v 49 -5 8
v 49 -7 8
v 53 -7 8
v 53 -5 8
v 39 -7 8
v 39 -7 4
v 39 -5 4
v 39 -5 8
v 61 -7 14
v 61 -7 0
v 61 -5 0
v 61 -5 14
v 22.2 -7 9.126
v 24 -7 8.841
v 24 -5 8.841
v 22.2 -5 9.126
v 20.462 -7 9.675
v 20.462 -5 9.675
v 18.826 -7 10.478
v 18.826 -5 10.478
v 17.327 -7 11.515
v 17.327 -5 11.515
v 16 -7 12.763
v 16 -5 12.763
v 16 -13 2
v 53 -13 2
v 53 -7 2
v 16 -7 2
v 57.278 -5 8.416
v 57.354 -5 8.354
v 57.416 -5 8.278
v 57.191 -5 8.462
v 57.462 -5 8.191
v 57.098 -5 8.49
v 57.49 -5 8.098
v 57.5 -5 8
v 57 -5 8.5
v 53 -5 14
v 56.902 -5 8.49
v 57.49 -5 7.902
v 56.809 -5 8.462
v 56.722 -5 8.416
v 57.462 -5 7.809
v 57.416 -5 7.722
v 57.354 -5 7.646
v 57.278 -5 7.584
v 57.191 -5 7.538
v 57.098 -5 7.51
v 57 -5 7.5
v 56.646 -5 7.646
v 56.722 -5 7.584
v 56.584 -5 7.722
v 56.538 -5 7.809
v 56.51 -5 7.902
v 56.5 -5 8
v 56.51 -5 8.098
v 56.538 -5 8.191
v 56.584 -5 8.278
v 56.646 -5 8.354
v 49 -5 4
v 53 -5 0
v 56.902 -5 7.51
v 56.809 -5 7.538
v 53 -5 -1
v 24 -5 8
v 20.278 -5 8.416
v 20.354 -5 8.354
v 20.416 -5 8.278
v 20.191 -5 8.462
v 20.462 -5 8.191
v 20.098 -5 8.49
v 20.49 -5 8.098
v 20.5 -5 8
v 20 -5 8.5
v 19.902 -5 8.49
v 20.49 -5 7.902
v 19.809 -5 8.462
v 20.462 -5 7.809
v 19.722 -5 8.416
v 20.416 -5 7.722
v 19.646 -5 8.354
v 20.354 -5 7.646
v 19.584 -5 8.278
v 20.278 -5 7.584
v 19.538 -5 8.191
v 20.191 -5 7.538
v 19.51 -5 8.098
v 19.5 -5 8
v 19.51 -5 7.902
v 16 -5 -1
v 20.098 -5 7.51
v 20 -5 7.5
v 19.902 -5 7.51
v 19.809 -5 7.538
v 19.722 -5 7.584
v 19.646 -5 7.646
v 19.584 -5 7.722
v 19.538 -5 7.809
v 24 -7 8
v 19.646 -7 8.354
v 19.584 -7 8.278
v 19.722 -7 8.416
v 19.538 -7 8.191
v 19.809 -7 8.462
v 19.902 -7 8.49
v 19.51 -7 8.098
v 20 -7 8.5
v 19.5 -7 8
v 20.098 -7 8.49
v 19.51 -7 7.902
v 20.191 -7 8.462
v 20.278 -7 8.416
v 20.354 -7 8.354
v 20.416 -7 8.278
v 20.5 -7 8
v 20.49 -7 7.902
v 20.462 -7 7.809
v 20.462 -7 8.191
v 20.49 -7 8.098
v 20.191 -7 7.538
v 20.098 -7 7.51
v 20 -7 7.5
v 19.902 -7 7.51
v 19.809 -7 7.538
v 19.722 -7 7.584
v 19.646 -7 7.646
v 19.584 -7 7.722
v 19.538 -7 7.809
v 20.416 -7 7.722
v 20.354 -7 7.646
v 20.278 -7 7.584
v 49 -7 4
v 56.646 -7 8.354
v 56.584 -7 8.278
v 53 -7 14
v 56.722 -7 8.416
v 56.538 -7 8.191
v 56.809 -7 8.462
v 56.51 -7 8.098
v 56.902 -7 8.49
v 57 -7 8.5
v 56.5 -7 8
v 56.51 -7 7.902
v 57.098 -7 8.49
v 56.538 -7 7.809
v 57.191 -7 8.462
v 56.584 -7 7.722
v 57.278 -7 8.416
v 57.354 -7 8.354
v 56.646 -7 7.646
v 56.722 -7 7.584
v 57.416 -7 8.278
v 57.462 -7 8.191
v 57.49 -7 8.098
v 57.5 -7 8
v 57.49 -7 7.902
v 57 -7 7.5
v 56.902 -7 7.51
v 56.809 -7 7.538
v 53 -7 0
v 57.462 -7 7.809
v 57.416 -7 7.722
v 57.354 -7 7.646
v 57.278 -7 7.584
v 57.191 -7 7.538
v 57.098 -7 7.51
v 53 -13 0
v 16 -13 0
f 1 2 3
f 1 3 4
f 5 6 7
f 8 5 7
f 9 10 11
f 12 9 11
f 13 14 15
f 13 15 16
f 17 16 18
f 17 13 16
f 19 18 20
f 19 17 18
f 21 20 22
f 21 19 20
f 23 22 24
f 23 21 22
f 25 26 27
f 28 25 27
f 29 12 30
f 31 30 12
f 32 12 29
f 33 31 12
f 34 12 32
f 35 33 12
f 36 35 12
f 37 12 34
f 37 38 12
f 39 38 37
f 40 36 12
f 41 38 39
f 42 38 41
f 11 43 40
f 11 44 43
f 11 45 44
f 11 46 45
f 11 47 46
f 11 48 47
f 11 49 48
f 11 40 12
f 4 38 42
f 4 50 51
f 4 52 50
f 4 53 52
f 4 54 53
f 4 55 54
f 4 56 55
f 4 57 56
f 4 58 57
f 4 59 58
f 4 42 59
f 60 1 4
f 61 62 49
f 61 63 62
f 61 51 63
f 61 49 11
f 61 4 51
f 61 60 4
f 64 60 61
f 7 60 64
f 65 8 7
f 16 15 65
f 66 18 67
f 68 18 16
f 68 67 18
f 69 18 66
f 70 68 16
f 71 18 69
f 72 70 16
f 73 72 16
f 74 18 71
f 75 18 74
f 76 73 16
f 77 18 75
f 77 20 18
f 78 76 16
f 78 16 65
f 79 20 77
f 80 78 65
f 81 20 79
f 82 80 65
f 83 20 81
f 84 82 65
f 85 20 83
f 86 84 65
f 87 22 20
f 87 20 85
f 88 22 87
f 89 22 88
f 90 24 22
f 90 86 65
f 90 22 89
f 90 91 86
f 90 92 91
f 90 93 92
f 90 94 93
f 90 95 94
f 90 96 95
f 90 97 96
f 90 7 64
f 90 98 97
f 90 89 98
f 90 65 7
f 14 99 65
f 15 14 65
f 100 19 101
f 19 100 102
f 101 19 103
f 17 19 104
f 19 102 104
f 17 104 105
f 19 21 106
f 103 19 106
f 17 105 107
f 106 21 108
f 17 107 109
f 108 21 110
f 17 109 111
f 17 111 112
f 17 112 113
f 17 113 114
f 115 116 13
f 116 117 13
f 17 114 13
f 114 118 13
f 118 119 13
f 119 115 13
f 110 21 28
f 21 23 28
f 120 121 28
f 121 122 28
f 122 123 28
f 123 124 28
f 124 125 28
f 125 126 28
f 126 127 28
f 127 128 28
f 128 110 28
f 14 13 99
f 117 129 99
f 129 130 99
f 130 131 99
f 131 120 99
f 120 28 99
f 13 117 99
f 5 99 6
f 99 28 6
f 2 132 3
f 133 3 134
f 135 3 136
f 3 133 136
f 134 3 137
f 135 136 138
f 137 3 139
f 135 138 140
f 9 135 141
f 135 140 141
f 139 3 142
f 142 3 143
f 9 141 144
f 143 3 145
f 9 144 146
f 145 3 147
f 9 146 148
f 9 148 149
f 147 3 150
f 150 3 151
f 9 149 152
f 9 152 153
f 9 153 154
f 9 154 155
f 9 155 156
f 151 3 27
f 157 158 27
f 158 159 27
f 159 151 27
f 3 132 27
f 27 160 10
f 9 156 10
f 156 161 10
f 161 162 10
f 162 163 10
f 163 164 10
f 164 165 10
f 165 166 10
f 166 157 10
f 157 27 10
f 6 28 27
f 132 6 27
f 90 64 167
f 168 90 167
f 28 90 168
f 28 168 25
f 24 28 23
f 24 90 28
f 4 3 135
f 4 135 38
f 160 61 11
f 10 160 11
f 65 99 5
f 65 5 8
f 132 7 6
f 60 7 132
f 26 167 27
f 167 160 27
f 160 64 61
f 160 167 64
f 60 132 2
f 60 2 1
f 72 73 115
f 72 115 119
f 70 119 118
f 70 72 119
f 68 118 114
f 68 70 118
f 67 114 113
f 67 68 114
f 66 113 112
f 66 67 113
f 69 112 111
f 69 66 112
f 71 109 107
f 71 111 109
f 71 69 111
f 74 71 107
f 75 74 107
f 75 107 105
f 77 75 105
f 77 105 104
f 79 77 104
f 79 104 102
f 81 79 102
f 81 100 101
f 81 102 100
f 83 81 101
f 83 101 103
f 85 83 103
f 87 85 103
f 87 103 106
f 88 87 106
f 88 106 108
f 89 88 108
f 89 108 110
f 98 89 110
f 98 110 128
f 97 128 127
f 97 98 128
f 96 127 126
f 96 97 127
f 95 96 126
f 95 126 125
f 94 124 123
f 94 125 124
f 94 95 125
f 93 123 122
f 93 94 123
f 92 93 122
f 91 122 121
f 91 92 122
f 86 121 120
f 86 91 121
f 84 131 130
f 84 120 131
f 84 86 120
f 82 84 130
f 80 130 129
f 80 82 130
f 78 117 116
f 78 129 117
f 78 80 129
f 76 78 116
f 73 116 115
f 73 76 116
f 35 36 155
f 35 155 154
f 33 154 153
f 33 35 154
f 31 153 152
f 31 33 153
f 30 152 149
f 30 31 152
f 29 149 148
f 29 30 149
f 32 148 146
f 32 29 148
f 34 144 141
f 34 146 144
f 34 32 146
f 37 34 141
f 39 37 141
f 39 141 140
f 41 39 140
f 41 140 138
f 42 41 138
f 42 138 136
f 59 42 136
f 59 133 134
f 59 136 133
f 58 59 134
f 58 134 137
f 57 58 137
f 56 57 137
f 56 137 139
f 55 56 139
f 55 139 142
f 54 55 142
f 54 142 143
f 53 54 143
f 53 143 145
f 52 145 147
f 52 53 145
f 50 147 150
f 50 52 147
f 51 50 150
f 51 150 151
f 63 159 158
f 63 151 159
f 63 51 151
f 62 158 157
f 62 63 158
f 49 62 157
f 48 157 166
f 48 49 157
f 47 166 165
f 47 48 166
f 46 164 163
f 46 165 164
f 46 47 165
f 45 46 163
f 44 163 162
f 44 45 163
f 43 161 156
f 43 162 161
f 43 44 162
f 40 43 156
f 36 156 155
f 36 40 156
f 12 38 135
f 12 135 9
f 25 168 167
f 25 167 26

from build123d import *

# Parameters (mm, degrees)
CYLINDER050_R     = 12.2
CYLINDER050_DEPTH = 2
CYLINDER003_R     = 0.5
CYLINDER003_DEPTH = 10
CYLINDER004_R     = 0.5
CYLINDER004_DEPTH = 10
BOX003_W          = 8
BOX003_H          = 2
BOX003_DEPTH      = 14
BOX004_W          = 10
BOX004_H          = 2
BOX004_DEPTH      = 4
PAD017_DEPTH      = 37
BOX002_W          = 8
BOX002_H          = 2
BOX002_DEPTH      = 14


with BuildPart() as cylinder050:
    # Cylinder050 → Cylinder050 (new body)
    with BuildSketch(Plane(origin=(25, -7, 21), x_dir=(1, 0, 0), z_dir=(0, 1, 0))):
        Circle(CYLINDER050_R)
    extrude(amount=CYLINDER050_DEPTH)


with BuildPart() as cylinder003:
    # Cylinder003 → Cylinder003 (new body)
    with BuildSketch(Plane(origin=(57, 0, 8), x_dir=(1, 0, 0), z_dir=(0, -1, 0))):
        Circle(CYLINDER003_R)
    extrude(amount=CYLINDER003_DEPTH)


with BuildPart() as fusion007:
    # Cylinder004 → Cylinder004 (new body)
    with BuildSketch(Plane(origin=(20, 0, 8), x_dir=(1, 0, 0), z_dir=(0, -1, 0))):
        Circle(CYLINDER004_R)
    extrude(amount=CYLINDER004_DEPTH)

    # Fusion007: union Cylinder003
    add(cylinder003.part)


with BuildPart() as cube003:
    # Box003 → Box003 (new body)
    with BuildSketch(Plane(origin=(16, -7, 0), x_dir=(1, 0, 0), z_dir=(0, 0, 1))):
        with Locations((4, 1)):
            Rectangle(BOX003_W, BOX003_H)
    extrude(amount=BOX003_DEPTH)


with BuildPart() as cube004:
    # Box004 → Box004 (new body)
    with BuildSketch(Plane(origin=(39, -7, 4), x_dir=(1, 0, 0), z_dir=(0, 0, 1))):
        with Locations((5, 1)):
            Rectangle(BOX004_W, BOX004_H)
    extrude(amount=BOX004_DEPTH)


with BuildPart() as cut002:
    # Sketch152 → Pad017 (new body)
    with BuildSketch(Plane.ZY):
        Polygon((-1, -5), (0, -13), (1.999611, -13), (1.999611, -7), (7.999909, -7), (7.999909, -5), align=None)
    extrude(amount=-PAD017_DEPTH)


with BuildPart() as cut002_1:
    # Body015 placement: moved
    add(cut002.part.moved(Location((16, 0, 0))))

    # Cut002: cut Cube004
    add(cube004.part, mode=Mode.SUBTRACT)


with BuildPart() as mountclip2:
    # Box002 → Box002 (new body)
    with BuildSketch(Plane(origin=(53, -7, 0), x_dir=(1, 0, 0), z_dir=(0, 0, 1))):
        with Locations((4, 1)):
            Rectangle(BOX002_W, BOX002_H)
    extrude(amount=BOX002_DEPTH)

    # Fusion006: union Cube003, Cut002
    add(cube003.part)
    add(cut002_1.part)

    # Cut003: cut Fusion007
    add(fusion007.part, mode=Mode.SUBTRACT)

    # Cut026: cut Cylinder050
    add(cylinder050.part, mode=Mode.SUBTRACT)


solid = mountclip2.part
